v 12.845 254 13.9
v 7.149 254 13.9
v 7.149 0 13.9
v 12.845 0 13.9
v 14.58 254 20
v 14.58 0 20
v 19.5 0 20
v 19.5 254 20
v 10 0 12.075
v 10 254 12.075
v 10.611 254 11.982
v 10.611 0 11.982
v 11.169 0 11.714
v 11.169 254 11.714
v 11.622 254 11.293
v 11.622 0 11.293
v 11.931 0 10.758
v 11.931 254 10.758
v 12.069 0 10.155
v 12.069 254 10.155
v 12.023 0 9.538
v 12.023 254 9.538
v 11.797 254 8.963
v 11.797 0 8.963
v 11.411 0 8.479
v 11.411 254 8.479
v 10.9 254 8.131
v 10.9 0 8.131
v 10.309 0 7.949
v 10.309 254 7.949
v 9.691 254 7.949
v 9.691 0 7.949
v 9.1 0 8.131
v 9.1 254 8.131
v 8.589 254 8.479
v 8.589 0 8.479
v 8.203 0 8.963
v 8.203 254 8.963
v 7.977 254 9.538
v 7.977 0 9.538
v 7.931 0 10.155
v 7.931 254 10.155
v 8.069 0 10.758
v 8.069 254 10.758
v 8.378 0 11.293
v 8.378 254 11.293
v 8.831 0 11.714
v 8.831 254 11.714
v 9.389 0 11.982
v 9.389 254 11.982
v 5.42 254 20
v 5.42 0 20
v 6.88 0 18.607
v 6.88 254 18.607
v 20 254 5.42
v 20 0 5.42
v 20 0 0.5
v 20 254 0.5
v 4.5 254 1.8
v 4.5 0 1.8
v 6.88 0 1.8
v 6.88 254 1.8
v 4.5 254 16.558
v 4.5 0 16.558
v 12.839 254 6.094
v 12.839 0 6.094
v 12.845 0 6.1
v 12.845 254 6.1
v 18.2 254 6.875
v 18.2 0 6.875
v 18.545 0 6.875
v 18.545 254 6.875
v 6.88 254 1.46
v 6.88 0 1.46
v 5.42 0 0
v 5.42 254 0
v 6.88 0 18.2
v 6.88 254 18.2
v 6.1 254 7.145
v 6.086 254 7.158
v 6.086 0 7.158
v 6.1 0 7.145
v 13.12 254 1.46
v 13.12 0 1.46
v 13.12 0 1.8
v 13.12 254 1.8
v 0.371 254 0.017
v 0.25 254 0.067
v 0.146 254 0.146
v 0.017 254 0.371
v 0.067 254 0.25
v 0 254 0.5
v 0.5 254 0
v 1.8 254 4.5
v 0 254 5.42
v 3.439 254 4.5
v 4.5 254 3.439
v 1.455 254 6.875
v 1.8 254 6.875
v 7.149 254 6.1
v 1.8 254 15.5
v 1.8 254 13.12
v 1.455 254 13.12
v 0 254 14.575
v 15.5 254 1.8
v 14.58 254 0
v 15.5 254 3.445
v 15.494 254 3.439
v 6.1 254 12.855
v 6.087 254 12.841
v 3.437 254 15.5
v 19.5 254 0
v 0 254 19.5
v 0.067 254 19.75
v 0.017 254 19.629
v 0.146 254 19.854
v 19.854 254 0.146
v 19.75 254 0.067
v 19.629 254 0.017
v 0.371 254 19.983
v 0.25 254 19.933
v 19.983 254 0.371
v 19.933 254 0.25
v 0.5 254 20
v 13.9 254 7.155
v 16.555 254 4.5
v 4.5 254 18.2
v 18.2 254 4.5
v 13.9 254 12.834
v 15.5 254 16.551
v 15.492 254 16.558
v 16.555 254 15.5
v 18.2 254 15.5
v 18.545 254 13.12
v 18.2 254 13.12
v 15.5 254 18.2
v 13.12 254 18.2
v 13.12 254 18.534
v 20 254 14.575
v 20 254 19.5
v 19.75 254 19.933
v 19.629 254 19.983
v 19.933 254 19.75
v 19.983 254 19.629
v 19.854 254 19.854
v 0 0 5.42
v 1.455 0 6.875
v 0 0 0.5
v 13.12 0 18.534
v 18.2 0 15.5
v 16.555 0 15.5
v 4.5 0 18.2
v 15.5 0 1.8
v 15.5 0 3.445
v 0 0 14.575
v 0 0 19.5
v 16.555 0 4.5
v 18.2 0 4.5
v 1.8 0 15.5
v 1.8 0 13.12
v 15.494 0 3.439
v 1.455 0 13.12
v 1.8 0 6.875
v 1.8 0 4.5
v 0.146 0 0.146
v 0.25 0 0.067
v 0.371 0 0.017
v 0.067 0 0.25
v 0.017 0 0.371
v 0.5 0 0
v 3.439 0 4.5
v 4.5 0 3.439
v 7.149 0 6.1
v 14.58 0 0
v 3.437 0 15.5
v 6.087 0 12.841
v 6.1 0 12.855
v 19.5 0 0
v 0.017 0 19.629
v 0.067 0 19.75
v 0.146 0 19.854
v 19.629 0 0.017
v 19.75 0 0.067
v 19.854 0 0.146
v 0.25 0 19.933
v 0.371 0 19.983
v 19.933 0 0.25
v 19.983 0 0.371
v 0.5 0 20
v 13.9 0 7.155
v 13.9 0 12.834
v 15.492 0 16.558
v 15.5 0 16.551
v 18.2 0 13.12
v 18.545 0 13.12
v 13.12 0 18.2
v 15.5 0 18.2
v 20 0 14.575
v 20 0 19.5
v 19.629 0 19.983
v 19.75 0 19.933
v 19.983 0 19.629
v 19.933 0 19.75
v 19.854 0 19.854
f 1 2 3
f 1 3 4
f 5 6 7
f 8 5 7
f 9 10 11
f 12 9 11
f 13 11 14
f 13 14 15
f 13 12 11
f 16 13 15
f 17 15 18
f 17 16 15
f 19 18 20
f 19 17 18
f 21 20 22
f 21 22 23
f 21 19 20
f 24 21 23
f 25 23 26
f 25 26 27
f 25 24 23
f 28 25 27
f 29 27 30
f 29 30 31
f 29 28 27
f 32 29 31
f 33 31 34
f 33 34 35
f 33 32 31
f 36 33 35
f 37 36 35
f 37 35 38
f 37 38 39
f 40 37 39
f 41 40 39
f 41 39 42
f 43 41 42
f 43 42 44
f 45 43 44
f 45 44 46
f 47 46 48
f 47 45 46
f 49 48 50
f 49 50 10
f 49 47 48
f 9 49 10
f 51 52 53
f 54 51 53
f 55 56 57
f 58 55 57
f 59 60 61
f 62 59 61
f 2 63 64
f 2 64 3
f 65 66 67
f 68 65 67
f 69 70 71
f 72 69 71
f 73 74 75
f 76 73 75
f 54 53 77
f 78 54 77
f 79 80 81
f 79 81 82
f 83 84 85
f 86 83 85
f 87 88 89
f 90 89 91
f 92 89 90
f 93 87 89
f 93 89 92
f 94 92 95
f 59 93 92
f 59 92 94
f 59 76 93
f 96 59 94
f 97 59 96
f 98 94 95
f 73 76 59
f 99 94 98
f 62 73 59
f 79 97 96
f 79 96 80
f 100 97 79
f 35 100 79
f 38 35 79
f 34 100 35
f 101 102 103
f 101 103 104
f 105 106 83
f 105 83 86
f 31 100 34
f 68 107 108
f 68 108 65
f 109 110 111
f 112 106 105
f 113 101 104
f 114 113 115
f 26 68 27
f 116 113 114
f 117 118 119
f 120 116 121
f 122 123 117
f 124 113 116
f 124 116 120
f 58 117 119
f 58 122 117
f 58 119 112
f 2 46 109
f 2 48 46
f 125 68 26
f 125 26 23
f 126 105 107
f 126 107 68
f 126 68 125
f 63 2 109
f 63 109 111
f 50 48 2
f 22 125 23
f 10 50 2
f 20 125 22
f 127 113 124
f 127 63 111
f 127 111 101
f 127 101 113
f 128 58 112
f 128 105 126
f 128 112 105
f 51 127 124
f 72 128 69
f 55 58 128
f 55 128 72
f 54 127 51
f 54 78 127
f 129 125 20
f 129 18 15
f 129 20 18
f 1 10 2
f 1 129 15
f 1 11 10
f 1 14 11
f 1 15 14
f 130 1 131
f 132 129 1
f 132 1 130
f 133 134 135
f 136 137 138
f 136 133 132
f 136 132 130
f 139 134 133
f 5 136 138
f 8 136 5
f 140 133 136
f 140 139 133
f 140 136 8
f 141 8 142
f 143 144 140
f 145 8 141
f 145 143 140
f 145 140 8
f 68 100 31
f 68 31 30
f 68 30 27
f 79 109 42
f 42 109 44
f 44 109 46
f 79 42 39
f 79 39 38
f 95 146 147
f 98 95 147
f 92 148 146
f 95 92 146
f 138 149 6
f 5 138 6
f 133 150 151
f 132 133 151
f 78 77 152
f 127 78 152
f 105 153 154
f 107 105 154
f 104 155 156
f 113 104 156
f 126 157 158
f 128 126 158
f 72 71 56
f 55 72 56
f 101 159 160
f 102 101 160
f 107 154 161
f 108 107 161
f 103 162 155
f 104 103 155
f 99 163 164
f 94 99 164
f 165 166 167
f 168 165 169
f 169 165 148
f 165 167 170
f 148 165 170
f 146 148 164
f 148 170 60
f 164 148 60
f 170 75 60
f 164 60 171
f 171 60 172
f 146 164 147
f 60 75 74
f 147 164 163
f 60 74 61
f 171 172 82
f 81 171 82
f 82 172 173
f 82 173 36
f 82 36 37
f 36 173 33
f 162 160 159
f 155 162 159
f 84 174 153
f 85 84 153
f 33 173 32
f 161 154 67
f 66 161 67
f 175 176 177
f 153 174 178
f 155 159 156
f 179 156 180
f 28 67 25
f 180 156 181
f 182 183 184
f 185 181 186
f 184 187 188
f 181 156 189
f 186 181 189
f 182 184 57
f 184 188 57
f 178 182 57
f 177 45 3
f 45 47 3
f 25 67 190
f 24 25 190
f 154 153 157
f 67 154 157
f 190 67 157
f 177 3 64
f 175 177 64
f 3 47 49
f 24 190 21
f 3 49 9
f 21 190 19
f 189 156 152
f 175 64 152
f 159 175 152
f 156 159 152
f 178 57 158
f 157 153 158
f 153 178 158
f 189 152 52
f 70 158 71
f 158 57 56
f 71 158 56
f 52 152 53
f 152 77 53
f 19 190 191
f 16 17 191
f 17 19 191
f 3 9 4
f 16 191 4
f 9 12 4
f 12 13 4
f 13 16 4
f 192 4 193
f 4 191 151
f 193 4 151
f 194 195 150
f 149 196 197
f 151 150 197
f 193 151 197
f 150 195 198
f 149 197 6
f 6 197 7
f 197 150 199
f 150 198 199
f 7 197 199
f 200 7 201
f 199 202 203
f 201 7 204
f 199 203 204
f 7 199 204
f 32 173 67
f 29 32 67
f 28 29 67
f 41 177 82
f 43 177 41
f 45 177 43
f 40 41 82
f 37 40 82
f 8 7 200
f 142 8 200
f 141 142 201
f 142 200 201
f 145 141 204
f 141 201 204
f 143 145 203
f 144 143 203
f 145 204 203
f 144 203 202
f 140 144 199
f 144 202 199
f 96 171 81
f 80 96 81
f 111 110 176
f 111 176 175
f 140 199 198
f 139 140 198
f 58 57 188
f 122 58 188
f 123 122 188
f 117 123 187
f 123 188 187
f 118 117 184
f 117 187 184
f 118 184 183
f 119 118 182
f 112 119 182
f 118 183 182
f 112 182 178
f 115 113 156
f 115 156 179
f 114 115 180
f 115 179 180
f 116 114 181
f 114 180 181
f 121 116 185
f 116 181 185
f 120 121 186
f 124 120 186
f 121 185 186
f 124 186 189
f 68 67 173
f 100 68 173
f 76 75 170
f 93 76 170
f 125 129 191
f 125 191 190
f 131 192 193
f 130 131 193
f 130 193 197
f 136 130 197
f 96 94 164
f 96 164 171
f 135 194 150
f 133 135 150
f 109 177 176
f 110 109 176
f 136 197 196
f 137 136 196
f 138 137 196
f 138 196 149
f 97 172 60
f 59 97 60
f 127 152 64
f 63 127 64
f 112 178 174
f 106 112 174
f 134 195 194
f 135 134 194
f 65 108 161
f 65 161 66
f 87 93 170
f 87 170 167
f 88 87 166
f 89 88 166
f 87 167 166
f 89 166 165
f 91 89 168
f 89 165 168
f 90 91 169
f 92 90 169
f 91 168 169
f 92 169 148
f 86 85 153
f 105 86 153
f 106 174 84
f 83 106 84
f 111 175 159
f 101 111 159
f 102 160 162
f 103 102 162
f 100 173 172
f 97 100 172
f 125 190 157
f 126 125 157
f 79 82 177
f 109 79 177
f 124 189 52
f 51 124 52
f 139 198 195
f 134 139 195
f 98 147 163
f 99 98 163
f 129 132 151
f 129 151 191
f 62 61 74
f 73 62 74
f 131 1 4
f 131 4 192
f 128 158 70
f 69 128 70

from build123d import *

# Parameters (mm, degrees)
SKETCH2_R              = 2.074585303
VSLOT2020_2020_5_DEPTH = 254


with BuildPart() as part:
    # Sketch2 → Vslot2020 2020(5) (new body)
    with BuildSketch(Plane.ZX):
        with BuildLine():
            Line((13.9, 7.149086807), (13.9, 12.844511469))
            Line((13.9, 12.844511469), (16.558493656, 15.492177728))
            Line((16.558493656, 15.492177728), (16.550703242, 15.5))
            Line((16.550703242, 15.5), (18.2, 15.5))
            Line((18.2, 15.5), (18.2, 13.12))
            Line((18.2, 13.12), (18.534428266, 13.12))
            Line((18.534428266, 13.12), (20, 14.58))
            Line((20, 14.58), (20, 19.5))
            ThreePointArc((20, 19.5), (19.853553391, 19.853553391), (19.5, 20))
            Line((19.5, 20), (14.575, 20))
            Line((14.575, 20), (13.12, 18.545))
            Line((13.12, 18.545), (13.12, 18.2))
            Line((13.12, 18.2), (15.5, 18.2))
            Line((15.5, 18.2), (15.5, 16.555))
            Line((15.5, 16.555), (12.834142613, 13.9))
            Line((12.834142613, 13.9), (7.155, 13.9))
            Line((7.155, 13.9), (4.5, 16.555))
            Line((4.5, 16.555), (4.5, 18.2))
            Line((4.5, 18.2), (6.875, 18.2))
            Line((6.875, 18.2), (6.875, 18.545))
            Line((6.875, 18.545), (5.42, 20))
            Line((5.42, 20), (0.5, 20))
            ThreePointArc((0.5, 20), (0.146446609, 19.853553391), (0, 19.5))
            Line((0, 19.5), (0, 14.58))
            Line((0, 14.58), (1.46, 13.12))
            Line((1.46, 13.12), (1.8, 13.12))
            Line((1.8, 13.12), (1.8, 15.5))
            Line((1.8, 15.5), (3.445, 15.5))
            Line((3.445, 15.5), (3.439339828, 15.494339828))
            Line((3.439339828, 15.494339828), (6.094339828, 12.839339828))
            Line((6.094339828, 12.839339828), (6.1, 12.845))
            Line((6.1, 12.845), (6.1, 7.149086807))
            Line((6.1, 7.149086807), (3.439339828, 4.5))
            Line((3.439339828, 4.5), (1.8, 4.5))
            Line((1.8, 4.5), (1.8, 6.88))
            Line((1.8, 6.88), (1.46, 6.88))
            Line((1.46, 6.88), (0, 5.42))
            Line((0, 5.42), (0, 0.5))
            ThreePointArc((0, 0.5), (0.146446609, 0.146446609), (0.5, 0))
            Line((0.5, 0), (5.42, 0))
            Line((5.42, 0), (6.875, 1.455))
            Line((6.875, 1.455), (6.875, 1.8))
            Line((6.875, 1.8), (4.5, 1.8))
            Line((4.5, 1.8), (4.5, 3.4393348))
            Line((4.5, 3.4393348), (7.158345795, 6.086117297))
            Line((7.158345795, 6.086117297), (7.144523479, 6.1))
            Line((7.144523479, 6.1), (12.854625295, 6.1))
            Line((12.854625295, 6.1), (12.841221344, 6.086548451))
            Line((12.841221344, 6.086548451), (15.499715, 3.437461644))
            Line((15.499715, 3.437461644), (15.5, 1.8))
            Line((15.5, 1.8), (13.12, 1.8))
            Line((13.12, 1.8), (13.12, 1.455))
            Line((13.12, 1.455), (14.575, 0))
            Line((14.575, 0), (19.5, 0))
            ThreePointArc((19.5, 0), (19.853553391, 0.146446609), (20, 0.5))
            Line((20, 0.5), (20, 5.42))
            Line((20, 5.42), (18.606904708, 6.88))
            Line((18.606904708, 6.88), (18.2, 6.88))
            Line((18.2, 6.88), (18.2, 4.5))
            Line((18.2, 4.5), (16.558493656, 4.5))
            Line((16.558493656, 4.5), (13.9, 7.149086807))
        make_face()
        with Locations((10, 10)):
            Circle(SKETCH2_R, mode=Mode.SUBTRACT)
    extrude(amount=VSLOT2020_2020_5_DEPTH)


solid = part.part
